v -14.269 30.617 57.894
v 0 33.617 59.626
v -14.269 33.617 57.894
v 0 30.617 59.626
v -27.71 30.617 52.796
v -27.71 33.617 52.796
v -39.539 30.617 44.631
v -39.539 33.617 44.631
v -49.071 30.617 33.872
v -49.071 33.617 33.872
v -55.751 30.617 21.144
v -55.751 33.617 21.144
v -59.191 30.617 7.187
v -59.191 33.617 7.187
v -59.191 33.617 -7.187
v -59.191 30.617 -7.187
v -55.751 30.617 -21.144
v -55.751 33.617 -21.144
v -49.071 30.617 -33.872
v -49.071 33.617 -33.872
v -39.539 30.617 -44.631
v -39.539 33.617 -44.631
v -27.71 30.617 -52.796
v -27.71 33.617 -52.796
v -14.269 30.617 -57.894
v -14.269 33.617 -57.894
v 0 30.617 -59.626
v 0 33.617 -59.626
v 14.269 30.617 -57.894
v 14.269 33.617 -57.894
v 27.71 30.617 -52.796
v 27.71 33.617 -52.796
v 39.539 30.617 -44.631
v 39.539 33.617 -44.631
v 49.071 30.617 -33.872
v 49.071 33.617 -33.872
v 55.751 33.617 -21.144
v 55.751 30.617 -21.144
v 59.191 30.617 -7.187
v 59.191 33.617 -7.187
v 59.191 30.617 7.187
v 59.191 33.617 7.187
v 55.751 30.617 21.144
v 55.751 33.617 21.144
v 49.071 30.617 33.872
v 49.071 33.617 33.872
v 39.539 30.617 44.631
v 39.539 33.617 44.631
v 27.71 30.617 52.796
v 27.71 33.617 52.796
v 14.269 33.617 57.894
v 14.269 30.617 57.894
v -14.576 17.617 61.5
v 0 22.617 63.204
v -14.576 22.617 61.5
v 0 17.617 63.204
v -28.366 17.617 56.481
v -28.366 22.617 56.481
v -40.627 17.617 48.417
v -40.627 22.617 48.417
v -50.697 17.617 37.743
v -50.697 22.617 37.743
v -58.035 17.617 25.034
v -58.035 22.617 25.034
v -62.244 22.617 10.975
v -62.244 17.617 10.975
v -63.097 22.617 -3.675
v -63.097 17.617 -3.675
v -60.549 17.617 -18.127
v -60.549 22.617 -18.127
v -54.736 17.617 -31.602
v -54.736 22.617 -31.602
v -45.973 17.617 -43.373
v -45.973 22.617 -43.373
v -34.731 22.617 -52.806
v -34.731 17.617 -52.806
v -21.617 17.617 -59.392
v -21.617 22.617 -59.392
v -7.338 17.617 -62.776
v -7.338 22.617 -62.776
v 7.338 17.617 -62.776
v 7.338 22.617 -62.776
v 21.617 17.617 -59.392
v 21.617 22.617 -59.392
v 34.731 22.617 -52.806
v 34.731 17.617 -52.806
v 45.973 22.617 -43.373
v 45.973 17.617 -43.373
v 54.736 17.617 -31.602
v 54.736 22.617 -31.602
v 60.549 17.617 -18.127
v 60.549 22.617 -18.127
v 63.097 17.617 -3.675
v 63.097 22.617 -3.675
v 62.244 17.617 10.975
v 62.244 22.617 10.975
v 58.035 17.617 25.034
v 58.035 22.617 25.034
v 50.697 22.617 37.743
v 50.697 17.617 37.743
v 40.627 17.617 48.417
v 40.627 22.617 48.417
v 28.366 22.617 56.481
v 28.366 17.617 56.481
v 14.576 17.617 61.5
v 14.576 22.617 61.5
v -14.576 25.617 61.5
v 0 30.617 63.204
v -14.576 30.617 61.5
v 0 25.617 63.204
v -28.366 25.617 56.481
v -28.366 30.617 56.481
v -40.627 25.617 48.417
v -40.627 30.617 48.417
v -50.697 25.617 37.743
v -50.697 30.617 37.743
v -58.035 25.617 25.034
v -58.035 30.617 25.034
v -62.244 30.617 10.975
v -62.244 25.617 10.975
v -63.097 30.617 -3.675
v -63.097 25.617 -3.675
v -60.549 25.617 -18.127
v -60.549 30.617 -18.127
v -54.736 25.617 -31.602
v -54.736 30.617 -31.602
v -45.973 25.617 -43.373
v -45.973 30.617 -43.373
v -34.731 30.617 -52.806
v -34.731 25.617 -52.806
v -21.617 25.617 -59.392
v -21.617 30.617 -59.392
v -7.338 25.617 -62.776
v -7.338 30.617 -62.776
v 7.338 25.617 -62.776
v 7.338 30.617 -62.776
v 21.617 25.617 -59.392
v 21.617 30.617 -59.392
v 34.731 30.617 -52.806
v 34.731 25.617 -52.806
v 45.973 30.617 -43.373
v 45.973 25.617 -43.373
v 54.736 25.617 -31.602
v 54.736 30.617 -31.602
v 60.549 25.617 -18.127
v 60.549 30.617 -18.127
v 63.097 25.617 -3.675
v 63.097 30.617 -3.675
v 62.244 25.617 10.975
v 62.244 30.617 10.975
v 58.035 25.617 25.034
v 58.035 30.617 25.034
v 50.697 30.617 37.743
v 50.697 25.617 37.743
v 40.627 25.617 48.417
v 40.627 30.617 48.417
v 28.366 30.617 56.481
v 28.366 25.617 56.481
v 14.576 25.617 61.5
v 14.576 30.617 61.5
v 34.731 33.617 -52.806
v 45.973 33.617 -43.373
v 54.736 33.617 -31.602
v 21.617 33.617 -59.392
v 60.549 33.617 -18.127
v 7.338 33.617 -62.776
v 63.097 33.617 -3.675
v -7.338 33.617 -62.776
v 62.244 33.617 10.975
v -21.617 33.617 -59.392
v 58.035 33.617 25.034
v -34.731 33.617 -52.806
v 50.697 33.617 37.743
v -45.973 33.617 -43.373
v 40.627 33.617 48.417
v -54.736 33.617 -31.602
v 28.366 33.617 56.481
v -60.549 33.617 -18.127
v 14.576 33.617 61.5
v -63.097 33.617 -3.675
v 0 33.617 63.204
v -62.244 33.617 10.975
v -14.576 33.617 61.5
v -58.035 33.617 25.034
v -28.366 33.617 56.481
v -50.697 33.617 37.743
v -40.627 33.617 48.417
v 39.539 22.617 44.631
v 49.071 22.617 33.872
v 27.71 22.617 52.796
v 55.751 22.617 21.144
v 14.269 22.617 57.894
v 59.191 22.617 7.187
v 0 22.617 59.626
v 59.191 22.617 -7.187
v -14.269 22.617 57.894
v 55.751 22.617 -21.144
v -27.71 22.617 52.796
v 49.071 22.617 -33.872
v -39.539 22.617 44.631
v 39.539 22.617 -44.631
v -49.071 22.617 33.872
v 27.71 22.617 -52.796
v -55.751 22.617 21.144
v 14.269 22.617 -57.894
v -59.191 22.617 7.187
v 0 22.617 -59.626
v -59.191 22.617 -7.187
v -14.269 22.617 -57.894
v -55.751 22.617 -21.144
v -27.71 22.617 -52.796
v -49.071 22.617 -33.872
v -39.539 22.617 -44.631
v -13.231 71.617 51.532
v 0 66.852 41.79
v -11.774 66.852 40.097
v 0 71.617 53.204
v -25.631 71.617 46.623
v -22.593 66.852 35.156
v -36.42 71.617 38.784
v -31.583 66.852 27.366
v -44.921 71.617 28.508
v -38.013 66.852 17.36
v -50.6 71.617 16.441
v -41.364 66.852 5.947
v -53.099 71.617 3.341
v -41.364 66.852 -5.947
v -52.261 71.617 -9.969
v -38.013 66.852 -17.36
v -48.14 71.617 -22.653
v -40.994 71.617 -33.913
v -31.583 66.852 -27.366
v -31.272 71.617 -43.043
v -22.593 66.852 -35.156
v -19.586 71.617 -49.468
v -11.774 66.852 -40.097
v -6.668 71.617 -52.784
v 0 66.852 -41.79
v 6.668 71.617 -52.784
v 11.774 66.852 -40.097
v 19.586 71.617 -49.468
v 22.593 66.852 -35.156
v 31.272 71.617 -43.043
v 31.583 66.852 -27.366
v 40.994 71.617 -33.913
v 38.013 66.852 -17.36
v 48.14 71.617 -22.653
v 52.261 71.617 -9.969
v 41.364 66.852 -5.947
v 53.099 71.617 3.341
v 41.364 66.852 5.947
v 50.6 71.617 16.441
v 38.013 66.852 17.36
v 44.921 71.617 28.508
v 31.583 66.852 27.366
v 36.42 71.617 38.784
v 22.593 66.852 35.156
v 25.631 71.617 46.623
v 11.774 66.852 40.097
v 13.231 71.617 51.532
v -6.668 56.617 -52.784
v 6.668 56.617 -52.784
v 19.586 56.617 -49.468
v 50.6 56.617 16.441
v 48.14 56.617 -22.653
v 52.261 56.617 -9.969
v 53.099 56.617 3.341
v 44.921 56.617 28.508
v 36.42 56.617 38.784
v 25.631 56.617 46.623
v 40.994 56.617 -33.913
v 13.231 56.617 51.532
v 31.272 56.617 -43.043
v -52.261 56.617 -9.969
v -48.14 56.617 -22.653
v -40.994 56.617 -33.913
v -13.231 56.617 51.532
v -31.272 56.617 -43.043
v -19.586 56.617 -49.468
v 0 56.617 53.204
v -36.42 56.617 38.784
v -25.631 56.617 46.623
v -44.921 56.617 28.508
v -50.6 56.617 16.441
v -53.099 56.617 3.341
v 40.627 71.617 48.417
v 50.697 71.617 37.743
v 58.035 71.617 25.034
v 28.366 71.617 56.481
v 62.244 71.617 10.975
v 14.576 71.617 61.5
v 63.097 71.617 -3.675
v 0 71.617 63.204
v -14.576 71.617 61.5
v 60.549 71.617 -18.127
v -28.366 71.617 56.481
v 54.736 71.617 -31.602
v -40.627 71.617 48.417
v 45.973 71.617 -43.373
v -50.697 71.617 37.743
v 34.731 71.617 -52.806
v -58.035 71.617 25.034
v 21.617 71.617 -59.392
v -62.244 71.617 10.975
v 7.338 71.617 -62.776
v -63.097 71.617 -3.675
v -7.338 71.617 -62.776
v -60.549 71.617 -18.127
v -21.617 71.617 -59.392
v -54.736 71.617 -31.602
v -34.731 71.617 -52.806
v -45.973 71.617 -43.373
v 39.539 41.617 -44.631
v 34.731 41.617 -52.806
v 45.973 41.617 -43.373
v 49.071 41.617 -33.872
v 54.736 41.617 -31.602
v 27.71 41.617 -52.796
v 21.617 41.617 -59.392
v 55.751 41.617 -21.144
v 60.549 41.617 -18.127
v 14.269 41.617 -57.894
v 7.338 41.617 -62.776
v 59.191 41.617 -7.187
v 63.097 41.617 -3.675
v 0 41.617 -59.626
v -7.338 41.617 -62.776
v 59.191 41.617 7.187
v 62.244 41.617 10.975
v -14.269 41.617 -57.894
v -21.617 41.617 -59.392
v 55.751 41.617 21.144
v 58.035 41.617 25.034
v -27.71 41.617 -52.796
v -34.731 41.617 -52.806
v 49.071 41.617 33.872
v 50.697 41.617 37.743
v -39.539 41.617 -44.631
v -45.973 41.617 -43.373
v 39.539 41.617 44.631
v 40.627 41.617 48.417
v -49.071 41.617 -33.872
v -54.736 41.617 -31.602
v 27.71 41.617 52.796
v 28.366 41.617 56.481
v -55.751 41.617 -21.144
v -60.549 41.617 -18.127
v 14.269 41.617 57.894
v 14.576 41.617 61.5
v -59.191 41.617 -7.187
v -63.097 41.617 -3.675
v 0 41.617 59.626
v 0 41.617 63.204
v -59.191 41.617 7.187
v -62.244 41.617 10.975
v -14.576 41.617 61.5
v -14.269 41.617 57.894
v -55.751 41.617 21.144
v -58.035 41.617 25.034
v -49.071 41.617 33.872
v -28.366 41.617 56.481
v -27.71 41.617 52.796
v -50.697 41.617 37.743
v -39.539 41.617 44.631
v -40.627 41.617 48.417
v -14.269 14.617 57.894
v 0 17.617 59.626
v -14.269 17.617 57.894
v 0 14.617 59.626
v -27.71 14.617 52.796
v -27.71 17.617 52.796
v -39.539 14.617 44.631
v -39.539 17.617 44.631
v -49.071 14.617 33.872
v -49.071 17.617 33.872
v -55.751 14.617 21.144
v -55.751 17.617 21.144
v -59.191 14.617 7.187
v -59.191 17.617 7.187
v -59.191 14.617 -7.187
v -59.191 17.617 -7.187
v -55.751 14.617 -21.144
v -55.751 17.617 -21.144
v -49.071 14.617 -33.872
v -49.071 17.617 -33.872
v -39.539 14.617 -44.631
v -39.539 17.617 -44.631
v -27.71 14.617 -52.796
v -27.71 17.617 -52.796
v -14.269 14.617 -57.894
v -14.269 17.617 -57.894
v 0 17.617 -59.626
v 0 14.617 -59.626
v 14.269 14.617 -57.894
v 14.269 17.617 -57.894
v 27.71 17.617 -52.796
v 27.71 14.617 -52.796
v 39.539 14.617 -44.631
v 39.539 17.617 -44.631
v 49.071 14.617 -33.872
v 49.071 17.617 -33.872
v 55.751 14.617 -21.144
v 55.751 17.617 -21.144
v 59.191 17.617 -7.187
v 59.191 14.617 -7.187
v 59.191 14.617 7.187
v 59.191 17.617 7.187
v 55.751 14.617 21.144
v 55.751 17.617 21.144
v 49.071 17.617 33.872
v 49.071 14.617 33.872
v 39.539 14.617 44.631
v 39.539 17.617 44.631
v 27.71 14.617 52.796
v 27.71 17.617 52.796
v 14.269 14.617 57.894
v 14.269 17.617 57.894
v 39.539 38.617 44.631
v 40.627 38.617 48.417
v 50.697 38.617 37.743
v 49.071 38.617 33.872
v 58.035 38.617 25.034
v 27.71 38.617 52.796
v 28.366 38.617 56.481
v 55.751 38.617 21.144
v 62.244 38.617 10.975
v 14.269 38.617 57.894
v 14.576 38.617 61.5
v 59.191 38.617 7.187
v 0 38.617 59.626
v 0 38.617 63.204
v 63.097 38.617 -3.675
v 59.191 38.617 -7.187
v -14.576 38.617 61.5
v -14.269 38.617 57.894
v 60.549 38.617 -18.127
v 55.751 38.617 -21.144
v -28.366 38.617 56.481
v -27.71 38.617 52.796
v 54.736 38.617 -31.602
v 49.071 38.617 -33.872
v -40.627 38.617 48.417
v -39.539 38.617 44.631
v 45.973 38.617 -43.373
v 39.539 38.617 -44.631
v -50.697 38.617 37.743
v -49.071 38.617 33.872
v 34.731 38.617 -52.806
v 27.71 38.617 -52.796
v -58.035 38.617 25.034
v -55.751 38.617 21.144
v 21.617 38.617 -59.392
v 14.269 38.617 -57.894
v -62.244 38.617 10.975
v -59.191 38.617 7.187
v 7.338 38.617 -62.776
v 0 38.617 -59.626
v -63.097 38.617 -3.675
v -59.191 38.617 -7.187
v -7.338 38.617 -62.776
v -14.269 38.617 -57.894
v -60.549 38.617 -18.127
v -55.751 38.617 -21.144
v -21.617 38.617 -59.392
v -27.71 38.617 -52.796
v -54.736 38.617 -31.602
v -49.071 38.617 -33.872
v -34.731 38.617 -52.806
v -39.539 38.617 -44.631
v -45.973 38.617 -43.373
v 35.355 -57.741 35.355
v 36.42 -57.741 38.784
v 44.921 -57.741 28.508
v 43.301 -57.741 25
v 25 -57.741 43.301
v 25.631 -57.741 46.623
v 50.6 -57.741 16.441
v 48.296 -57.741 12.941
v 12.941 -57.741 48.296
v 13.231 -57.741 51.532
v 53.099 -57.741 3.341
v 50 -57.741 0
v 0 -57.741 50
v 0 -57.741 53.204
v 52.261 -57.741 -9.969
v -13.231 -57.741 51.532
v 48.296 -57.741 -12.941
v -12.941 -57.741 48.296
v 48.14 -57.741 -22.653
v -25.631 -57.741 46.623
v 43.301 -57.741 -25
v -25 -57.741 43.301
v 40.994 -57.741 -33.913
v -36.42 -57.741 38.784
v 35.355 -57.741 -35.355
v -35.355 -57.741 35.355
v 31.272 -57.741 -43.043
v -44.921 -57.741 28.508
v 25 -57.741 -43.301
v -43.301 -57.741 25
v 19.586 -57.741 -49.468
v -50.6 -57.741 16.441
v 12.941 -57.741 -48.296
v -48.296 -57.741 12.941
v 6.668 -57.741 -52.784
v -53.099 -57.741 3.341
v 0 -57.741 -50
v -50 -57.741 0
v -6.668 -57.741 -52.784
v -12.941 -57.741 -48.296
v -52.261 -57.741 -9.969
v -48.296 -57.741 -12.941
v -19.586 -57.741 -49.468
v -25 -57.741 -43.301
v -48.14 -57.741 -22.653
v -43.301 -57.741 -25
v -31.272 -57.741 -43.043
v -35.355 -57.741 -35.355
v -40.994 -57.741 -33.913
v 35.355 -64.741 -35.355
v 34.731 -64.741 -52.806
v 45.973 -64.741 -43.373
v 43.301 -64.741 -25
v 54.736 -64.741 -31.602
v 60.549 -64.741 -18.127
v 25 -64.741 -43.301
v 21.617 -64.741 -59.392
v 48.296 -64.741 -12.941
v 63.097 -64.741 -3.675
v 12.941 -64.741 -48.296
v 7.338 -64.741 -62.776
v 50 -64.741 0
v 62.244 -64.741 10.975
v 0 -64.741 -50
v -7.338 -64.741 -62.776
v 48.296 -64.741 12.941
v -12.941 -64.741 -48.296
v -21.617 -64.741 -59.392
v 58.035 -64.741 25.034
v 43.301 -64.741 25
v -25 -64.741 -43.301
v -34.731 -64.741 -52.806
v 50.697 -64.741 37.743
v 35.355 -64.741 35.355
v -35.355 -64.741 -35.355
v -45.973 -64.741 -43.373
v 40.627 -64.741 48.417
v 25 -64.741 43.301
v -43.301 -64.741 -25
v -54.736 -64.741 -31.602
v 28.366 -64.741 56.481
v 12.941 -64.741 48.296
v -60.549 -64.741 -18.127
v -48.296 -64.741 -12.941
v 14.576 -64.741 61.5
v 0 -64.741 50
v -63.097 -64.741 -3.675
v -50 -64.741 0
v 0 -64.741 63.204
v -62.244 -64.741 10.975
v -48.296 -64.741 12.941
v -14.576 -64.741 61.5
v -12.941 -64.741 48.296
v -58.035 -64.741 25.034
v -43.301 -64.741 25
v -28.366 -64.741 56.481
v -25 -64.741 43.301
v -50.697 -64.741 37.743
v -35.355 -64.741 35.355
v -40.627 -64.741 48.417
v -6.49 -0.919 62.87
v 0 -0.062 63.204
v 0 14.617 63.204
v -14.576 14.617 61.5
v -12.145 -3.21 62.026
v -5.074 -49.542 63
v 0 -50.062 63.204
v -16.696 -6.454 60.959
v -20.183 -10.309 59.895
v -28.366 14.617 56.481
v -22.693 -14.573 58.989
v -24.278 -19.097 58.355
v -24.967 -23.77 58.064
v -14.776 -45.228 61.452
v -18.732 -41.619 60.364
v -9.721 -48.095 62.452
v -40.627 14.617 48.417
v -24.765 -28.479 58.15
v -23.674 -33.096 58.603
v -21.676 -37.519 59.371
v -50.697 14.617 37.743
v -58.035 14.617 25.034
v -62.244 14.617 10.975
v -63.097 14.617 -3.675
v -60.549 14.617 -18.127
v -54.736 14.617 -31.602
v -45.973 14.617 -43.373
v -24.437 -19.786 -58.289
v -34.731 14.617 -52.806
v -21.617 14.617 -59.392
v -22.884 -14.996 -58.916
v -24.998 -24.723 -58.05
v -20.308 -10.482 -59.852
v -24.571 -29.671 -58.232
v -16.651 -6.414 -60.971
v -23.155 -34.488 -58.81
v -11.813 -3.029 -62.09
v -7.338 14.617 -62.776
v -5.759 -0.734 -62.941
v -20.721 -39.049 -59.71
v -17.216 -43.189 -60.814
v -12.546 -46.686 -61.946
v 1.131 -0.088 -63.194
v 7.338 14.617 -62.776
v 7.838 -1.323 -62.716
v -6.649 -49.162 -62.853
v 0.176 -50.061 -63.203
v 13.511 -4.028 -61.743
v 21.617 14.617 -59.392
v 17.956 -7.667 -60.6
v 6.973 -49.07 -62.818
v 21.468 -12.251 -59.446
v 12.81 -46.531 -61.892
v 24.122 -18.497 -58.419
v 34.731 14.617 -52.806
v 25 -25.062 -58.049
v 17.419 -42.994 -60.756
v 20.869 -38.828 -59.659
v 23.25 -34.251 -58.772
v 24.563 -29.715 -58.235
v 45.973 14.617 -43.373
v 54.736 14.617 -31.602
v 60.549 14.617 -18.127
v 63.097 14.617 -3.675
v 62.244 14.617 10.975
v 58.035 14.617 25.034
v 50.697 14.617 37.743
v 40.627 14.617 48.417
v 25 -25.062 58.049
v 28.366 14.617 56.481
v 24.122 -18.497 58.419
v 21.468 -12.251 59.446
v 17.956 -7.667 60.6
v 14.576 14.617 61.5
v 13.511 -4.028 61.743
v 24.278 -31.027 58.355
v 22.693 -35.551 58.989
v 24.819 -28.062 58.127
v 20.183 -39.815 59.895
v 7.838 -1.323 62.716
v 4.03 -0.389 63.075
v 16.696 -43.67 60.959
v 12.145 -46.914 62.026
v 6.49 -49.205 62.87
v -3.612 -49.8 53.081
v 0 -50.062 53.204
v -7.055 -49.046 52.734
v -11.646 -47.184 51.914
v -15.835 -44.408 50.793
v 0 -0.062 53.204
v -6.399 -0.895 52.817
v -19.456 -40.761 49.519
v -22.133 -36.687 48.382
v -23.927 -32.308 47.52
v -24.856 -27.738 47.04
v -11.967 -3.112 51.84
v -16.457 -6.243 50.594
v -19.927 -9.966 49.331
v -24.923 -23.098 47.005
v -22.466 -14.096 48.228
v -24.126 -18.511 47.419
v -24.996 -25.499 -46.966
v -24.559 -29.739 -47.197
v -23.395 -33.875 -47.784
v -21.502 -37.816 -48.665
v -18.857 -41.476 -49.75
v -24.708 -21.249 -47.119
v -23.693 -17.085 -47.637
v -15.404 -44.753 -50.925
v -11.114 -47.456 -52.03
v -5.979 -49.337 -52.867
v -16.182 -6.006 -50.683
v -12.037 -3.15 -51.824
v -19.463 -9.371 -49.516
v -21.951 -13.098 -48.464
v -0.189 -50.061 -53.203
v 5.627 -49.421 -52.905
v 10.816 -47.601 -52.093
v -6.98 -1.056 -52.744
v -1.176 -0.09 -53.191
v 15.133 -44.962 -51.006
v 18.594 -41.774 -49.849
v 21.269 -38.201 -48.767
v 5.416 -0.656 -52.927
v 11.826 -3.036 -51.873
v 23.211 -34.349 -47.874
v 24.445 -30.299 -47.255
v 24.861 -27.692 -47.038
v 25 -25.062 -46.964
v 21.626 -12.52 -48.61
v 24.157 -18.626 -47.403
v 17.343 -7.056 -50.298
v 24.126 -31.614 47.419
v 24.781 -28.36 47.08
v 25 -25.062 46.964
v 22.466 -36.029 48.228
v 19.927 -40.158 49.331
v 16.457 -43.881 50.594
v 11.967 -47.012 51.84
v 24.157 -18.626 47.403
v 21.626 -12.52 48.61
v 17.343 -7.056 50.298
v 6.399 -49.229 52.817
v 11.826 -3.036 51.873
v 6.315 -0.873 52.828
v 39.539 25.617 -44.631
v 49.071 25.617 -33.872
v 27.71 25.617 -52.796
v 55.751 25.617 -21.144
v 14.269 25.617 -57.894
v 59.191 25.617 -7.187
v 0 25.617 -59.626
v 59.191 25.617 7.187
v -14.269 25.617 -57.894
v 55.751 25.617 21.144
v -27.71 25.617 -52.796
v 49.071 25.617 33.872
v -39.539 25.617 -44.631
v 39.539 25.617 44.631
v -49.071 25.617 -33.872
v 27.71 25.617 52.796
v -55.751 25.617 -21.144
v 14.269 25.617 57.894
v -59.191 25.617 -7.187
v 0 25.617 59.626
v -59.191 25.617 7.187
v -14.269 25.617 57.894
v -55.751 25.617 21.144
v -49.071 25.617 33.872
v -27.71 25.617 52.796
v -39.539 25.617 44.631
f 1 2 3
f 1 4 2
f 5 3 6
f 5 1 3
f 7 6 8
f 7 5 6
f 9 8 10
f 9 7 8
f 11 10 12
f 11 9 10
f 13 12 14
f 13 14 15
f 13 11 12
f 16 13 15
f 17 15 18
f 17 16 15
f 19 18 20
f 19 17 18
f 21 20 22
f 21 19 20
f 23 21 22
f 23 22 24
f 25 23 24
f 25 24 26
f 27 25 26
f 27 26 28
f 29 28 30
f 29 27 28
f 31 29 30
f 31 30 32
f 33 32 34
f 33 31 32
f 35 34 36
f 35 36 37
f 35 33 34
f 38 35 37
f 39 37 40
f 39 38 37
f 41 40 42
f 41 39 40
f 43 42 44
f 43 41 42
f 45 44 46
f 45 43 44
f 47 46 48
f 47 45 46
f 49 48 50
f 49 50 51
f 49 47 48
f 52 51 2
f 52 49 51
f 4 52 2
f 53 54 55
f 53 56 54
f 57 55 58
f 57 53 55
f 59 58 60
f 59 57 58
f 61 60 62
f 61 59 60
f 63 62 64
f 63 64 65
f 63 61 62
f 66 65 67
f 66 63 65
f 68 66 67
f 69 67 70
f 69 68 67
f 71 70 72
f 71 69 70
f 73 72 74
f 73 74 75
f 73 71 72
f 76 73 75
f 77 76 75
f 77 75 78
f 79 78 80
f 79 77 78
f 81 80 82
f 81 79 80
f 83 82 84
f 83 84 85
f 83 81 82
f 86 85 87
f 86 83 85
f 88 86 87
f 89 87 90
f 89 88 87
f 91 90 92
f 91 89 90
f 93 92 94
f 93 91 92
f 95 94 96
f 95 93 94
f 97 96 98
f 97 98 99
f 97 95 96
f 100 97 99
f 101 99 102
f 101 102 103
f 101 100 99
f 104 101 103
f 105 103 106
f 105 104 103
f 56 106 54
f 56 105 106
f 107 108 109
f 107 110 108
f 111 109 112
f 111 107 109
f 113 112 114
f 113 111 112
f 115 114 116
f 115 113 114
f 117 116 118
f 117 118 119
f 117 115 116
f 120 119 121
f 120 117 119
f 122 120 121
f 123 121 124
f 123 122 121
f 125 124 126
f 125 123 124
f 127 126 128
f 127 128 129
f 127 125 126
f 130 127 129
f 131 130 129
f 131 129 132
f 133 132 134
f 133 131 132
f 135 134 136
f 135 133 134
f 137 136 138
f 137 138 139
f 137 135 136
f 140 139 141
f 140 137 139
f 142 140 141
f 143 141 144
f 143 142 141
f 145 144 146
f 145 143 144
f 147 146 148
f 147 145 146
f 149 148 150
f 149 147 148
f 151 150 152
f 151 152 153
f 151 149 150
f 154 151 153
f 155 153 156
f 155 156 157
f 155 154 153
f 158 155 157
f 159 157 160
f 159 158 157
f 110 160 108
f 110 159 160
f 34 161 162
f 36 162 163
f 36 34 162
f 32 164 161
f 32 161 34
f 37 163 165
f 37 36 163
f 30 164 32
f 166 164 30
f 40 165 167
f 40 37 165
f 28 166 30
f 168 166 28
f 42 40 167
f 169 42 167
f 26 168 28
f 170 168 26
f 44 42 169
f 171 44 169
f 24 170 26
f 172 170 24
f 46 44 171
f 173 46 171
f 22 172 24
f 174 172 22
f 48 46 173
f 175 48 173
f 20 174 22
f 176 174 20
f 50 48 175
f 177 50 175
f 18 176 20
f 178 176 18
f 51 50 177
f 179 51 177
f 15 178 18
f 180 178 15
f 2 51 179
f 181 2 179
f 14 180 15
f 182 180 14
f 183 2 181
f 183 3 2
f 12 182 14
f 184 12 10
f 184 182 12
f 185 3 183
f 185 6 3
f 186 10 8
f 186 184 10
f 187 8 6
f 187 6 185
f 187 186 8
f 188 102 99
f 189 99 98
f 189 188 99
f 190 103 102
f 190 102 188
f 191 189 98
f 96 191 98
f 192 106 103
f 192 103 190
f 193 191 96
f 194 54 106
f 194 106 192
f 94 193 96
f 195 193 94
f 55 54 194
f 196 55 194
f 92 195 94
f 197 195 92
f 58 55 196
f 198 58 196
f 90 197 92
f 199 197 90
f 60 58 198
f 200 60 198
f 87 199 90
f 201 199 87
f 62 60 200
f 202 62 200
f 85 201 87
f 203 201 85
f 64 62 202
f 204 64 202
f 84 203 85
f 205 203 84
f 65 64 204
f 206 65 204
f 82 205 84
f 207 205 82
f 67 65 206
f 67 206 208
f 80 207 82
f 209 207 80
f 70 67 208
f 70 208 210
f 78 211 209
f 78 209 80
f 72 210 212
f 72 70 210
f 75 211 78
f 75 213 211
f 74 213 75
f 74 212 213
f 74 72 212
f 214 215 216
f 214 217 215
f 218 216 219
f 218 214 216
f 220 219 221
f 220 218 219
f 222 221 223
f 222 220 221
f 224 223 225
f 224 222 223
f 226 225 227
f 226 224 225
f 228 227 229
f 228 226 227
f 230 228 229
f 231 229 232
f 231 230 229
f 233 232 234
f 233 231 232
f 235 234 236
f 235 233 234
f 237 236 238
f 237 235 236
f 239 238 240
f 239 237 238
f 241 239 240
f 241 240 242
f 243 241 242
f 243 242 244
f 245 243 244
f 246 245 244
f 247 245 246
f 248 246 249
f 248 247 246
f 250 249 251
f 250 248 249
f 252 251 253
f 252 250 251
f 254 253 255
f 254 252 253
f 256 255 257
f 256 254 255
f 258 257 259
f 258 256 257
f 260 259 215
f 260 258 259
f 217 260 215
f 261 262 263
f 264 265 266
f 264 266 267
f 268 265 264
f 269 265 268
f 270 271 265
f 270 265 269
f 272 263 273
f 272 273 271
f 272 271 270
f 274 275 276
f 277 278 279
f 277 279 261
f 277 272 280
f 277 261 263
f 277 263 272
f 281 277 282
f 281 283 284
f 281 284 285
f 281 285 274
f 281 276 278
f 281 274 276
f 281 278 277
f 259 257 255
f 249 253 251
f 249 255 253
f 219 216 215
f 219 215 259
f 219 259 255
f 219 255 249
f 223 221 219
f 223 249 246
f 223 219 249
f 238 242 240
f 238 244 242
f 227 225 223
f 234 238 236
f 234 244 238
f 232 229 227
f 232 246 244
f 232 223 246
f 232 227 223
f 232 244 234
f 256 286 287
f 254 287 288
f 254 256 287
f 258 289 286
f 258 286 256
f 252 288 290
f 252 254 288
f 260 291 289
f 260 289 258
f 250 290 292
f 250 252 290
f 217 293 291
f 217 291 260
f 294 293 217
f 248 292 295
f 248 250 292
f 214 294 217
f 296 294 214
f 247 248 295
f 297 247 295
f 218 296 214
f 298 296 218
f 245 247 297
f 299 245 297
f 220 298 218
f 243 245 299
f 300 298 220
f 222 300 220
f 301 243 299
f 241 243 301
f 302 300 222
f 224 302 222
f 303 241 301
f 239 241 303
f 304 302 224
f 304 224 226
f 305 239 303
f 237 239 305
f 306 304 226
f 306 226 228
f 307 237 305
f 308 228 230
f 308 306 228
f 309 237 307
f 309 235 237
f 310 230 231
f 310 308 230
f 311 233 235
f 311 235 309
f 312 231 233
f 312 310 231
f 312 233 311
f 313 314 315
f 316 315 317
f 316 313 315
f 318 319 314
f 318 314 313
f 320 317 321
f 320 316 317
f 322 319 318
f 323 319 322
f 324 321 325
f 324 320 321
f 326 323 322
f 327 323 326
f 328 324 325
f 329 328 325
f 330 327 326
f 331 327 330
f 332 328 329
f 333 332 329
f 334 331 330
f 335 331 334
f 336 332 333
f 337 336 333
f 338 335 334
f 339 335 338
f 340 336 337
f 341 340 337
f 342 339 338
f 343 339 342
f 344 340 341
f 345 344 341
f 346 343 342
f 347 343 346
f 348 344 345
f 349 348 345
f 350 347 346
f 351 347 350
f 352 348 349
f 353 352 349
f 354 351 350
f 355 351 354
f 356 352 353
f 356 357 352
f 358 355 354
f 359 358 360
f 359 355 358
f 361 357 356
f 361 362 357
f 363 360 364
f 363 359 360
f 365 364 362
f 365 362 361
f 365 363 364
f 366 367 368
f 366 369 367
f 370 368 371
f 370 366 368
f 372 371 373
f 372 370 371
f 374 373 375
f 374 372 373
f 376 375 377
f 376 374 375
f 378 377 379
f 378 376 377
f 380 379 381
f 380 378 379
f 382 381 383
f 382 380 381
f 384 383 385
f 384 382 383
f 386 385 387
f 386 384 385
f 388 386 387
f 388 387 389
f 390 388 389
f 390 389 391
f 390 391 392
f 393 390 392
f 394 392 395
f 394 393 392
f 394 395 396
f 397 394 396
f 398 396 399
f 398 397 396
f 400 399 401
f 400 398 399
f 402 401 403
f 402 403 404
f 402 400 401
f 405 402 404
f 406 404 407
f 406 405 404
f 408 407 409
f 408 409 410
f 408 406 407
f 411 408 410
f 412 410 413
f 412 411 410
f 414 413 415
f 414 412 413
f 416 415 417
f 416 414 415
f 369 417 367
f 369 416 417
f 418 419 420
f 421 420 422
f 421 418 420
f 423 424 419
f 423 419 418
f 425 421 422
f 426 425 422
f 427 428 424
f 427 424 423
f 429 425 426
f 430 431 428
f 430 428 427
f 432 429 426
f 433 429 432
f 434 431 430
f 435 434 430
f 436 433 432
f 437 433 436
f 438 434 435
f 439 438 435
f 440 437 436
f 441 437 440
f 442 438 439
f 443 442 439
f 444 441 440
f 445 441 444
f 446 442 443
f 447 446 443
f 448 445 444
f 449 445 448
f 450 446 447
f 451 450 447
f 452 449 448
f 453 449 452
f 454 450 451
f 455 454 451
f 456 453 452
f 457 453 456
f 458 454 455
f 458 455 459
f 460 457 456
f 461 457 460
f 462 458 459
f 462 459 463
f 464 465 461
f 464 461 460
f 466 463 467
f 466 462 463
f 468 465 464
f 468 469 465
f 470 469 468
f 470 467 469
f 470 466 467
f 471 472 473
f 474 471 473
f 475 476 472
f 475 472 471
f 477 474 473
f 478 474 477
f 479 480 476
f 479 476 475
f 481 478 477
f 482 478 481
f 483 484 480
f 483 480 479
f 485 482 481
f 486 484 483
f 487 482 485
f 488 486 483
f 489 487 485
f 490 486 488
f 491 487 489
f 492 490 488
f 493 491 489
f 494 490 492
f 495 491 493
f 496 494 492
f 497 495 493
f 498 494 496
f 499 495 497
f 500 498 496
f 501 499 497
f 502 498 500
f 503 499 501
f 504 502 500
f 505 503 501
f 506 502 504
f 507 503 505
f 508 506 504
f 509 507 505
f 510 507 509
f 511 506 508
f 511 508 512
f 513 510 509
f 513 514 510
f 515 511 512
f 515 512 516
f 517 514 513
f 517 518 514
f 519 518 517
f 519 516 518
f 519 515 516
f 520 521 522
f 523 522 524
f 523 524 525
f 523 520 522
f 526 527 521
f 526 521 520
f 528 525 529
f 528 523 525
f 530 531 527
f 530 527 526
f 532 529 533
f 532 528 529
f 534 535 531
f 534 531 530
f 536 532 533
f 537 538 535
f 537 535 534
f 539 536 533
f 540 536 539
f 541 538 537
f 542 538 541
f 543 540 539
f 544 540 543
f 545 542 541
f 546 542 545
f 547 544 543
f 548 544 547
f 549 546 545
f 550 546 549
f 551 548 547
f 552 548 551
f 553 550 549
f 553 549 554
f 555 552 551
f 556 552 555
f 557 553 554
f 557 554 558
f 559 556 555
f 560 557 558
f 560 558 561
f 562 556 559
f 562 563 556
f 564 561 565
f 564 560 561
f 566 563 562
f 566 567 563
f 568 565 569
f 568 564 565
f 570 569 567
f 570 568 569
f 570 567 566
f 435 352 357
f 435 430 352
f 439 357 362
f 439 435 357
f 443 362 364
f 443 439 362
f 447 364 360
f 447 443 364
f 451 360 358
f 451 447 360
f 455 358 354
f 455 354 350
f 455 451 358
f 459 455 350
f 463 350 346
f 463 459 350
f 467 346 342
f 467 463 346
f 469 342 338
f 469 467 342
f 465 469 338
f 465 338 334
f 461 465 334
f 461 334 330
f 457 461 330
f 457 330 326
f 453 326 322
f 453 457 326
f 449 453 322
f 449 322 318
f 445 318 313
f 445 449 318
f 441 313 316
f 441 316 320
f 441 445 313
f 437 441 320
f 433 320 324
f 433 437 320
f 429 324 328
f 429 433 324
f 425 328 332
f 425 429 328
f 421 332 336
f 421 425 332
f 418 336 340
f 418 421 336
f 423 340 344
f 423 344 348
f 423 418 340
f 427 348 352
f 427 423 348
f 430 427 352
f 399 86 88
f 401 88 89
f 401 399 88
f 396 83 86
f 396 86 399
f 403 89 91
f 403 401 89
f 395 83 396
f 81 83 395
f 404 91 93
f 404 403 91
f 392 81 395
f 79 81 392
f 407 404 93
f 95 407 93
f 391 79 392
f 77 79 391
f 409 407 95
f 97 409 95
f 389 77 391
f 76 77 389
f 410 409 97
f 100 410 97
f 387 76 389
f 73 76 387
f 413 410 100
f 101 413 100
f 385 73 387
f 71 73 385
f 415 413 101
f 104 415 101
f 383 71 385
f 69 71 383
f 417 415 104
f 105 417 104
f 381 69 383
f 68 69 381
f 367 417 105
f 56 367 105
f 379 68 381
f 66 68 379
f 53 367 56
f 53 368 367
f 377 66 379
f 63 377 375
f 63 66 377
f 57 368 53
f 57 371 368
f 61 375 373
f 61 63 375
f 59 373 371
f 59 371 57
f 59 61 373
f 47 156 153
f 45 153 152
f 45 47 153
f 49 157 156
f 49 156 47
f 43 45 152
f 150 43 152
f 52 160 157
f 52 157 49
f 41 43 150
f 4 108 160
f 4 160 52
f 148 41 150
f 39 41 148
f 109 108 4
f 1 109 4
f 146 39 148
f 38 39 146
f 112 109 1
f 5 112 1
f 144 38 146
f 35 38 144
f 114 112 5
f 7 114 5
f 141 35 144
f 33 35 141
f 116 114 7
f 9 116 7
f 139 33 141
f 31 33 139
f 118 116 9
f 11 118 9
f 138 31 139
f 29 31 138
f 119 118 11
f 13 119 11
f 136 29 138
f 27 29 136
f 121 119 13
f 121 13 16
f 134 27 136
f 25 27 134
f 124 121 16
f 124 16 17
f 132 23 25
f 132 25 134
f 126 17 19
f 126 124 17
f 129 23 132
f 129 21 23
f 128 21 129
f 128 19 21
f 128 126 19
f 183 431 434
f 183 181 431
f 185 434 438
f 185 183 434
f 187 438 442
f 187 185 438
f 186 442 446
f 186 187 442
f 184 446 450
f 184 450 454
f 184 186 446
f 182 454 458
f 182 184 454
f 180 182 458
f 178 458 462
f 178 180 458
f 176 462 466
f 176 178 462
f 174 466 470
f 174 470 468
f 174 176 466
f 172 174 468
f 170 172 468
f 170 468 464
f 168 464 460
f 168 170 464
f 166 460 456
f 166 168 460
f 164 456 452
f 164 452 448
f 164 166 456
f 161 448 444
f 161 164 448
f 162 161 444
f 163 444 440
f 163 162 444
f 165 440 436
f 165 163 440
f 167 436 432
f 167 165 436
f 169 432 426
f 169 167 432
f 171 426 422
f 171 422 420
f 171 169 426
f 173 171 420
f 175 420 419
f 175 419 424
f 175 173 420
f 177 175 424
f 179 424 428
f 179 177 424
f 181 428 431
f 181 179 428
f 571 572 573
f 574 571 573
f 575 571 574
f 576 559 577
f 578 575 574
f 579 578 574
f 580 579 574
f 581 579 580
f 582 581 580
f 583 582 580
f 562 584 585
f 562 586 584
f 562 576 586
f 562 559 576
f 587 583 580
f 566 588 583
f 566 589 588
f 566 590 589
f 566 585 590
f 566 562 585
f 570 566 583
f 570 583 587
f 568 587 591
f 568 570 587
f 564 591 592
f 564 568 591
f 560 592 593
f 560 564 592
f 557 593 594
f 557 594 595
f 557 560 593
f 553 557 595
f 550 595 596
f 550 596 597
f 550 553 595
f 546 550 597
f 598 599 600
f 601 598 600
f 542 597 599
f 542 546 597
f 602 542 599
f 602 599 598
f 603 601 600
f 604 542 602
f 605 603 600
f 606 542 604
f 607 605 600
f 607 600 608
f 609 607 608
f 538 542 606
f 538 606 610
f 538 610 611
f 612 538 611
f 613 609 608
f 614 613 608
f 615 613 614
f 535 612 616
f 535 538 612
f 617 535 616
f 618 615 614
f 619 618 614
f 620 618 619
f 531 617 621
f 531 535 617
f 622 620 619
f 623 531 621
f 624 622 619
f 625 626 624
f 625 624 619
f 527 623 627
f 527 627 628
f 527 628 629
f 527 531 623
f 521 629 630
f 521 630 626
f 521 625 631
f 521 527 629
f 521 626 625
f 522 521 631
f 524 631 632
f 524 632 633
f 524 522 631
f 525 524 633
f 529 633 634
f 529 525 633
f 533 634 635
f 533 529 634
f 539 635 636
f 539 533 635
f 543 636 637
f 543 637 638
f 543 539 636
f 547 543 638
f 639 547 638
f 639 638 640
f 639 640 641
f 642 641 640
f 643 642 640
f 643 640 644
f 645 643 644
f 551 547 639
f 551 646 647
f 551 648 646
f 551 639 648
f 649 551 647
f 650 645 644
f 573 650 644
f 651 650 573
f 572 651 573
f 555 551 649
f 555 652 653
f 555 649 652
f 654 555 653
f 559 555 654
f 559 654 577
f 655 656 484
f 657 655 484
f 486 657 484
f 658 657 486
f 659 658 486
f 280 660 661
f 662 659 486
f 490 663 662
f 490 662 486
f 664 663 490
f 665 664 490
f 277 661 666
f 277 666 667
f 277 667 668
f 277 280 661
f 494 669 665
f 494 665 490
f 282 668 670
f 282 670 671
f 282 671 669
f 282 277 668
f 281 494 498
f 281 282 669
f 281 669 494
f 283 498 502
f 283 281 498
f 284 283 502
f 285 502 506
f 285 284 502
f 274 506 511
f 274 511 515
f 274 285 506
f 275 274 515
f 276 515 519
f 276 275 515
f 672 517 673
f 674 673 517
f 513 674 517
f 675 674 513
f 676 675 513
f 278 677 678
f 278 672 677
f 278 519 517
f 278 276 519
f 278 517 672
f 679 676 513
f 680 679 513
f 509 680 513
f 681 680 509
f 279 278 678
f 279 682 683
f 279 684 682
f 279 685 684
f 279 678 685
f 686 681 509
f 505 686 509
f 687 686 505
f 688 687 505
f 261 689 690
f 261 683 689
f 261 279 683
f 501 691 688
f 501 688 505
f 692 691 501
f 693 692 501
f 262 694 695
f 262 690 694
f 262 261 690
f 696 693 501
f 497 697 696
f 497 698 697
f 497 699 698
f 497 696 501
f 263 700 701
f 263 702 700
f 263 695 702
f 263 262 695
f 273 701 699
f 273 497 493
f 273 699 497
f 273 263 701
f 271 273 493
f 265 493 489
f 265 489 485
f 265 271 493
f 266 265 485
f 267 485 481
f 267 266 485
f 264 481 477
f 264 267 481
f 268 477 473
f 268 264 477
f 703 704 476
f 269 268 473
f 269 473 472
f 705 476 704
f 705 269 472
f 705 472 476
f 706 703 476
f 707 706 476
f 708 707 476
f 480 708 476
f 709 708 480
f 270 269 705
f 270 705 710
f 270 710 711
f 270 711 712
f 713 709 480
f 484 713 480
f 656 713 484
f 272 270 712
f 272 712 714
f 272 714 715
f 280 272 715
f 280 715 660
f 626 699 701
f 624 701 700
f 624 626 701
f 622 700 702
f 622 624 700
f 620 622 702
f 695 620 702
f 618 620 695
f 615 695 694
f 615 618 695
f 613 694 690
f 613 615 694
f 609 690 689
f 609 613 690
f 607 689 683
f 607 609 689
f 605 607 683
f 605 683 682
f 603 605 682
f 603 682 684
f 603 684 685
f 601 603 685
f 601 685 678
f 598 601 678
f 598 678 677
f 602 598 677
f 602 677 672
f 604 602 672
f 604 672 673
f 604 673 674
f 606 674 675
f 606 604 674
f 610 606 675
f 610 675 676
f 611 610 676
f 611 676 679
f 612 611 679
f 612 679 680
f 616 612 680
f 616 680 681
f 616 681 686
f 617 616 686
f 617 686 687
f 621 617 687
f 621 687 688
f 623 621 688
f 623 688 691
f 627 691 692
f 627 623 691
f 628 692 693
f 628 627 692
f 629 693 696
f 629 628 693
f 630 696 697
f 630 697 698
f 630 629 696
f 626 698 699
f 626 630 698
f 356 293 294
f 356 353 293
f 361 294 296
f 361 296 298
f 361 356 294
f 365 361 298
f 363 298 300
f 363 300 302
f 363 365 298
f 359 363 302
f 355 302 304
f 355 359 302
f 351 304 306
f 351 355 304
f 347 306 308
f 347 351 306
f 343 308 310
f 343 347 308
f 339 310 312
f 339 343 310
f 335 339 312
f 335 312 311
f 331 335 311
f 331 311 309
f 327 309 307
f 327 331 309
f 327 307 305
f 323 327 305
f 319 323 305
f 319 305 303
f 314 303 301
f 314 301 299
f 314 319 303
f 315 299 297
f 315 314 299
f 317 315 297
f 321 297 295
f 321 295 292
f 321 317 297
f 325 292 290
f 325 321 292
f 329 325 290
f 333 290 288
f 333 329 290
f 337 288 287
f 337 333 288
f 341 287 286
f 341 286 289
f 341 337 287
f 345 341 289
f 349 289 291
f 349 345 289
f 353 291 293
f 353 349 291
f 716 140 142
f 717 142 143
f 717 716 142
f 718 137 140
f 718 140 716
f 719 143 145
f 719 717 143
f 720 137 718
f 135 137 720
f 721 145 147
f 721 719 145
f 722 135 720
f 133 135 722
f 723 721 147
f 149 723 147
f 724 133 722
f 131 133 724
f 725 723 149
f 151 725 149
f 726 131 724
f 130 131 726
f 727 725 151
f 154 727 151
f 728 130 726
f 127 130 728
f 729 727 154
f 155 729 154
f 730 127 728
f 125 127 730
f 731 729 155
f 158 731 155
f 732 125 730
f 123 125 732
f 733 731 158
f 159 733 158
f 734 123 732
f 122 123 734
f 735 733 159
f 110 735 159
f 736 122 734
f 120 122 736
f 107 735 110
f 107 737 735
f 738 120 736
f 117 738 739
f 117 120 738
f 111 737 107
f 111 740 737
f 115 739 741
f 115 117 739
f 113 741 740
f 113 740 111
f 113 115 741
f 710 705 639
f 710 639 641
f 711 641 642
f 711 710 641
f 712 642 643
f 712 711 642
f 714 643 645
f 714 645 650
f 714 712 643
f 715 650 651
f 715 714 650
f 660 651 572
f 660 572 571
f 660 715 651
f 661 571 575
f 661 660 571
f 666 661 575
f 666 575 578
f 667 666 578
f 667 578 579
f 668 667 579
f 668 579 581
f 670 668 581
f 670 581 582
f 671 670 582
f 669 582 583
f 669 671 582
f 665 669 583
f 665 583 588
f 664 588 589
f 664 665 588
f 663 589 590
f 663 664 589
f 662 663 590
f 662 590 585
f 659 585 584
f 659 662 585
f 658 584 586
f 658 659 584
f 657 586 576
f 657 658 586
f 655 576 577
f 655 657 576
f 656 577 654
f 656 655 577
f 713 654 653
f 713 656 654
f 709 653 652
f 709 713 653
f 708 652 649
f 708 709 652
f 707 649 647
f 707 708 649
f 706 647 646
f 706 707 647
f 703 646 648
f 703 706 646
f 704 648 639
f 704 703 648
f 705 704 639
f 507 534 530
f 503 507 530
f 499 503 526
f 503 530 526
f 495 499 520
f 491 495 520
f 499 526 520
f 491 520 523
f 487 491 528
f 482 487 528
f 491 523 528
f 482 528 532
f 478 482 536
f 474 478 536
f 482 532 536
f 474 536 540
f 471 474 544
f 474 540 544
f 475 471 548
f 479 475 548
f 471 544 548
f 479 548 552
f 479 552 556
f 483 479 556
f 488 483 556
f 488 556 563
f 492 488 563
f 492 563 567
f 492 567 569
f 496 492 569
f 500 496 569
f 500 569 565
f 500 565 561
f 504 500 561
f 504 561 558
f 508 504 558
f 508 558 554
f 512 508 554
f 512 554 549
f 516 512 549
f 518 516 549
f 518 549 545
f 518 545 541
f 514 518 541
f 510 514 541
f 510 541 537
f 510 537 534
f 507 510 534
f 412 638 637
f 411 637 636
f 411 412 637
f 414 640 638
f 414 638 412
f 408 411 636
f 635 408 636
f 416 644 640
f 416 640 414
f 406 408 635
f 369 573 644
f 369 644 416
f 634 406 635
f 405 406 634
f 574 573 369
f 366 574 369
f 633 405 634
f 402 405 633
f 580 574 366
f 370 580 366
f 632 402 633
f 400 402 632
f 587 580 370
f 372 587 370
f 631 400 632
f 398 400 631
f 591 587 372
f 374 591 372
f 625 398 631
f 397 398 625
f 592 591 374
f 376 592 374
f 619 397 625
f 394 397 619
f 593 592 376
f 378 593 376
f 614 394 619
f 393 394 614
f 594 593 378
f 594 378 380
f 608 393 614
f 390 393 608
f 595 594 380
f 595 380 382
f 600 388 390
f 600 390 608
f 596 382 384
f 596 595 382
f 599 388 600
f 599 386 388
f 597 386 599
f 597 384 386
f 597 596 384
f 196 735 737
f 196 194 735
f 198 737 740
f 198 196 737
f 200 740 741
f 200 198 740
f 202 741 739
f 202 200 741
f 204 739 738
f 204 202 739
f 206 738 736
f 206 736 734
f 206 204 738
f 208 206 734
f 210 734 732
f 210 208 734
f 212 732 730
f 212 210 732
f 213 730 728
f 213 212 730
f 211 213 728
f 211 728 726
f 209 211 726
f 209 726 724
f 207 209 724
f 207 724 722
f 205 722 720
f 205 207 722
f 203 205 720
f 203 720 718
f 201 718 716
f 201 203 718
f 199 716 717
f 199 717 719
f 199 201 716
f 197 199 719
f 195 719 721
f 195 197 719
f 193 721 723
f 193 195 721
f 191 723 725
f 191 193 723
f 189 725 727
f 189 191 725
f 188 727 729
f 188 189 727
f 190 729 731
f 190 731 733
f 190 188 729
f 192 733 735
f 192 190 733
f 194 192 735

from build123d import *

# Parameters (mm, degrees)
CUT_EXTRUDE2_DEPTH      = 115.535519609
CUT_EXTRUDE2_DEPTH_BACK = 115.535519609
SKETCH2_R               = 25
SKETCH3_R               = 50
CUT_EXTRUDE4_DEPTH      = 11


with BuildPart() as part:
    # Sketch1 → Revolve1 (revolve)
    with BuildSketch(Plane.XY, mode=Mode.PRIVATE) as revolve1_sk:
        Polygon((-63.203744258, 71.61674857), (-63.203744258, 41.61674857), (-59.626173828, 41.61674857), (-59.626173828, 38.61674857), (-63.203744258, 38.61674857), (-63.203744258, 33.61674857), (-59.626173828, 33.61674857), (-59.626173828, 30.61674857), (-63.203744258, 30.61674857), (-63.203744258, 25.61674857), (-59.626173828, 25.61674857), (-59.626173828, 22.61674857), (-63.203744258, 22.61674857), (-63.203744258, 17.61674857), (-59.626173828, 17.61674857), (-59.626173828, 14.61674857), (-63.203744258, 14.61674857), (-63.203744258, -64.740949558), (0, -64.740949558), (0, -57.740949558), (-53.203744258, -57.740949558), (-53.203744258, 56.61674857), (0, 56.61674857), (0, 66.852401658), (-41.78964032, 66.852401658), (-53.203744258, 71.61674857), align=None)
    revolve(revolve1_sk.sketch.rotate(Axis((0, 112.693468535, 0), (0, -1, 0)), 270), axis=Axis((0, 112.693468535, 0), (0, -1, 0)))

    # Sketch2 → Cut-Extrude2 (cut, two sides: drawn at the far end of the back side and taken through both)
    with BuildSketch(Plane.XY.offset(-CUT_EXTRUDE2_DEPTH_BACK)):
        with Locations((0, -25.062100494)):
            Circle(SKETCH2_R)
    extrude(amount=CUT_EXTRUDE2_DEPTH + CUT_EXTRUDE2_DEPTH_BACK, mode=Mode.SUBTRACT)

    # Sketch3 → Cut-Extrude4 (cut)
    with BuildSketch(Plane.XZ.offset(64.740949558)):
        with Locations(Location((0, 0, 0), (0, 0, 270))):
            Circle(SKETCH3_R)
    extrude(amount=-CUT_EXTRUDE4_DEPTH, mode=Mode.SUBTRACT)


solid = part.part
